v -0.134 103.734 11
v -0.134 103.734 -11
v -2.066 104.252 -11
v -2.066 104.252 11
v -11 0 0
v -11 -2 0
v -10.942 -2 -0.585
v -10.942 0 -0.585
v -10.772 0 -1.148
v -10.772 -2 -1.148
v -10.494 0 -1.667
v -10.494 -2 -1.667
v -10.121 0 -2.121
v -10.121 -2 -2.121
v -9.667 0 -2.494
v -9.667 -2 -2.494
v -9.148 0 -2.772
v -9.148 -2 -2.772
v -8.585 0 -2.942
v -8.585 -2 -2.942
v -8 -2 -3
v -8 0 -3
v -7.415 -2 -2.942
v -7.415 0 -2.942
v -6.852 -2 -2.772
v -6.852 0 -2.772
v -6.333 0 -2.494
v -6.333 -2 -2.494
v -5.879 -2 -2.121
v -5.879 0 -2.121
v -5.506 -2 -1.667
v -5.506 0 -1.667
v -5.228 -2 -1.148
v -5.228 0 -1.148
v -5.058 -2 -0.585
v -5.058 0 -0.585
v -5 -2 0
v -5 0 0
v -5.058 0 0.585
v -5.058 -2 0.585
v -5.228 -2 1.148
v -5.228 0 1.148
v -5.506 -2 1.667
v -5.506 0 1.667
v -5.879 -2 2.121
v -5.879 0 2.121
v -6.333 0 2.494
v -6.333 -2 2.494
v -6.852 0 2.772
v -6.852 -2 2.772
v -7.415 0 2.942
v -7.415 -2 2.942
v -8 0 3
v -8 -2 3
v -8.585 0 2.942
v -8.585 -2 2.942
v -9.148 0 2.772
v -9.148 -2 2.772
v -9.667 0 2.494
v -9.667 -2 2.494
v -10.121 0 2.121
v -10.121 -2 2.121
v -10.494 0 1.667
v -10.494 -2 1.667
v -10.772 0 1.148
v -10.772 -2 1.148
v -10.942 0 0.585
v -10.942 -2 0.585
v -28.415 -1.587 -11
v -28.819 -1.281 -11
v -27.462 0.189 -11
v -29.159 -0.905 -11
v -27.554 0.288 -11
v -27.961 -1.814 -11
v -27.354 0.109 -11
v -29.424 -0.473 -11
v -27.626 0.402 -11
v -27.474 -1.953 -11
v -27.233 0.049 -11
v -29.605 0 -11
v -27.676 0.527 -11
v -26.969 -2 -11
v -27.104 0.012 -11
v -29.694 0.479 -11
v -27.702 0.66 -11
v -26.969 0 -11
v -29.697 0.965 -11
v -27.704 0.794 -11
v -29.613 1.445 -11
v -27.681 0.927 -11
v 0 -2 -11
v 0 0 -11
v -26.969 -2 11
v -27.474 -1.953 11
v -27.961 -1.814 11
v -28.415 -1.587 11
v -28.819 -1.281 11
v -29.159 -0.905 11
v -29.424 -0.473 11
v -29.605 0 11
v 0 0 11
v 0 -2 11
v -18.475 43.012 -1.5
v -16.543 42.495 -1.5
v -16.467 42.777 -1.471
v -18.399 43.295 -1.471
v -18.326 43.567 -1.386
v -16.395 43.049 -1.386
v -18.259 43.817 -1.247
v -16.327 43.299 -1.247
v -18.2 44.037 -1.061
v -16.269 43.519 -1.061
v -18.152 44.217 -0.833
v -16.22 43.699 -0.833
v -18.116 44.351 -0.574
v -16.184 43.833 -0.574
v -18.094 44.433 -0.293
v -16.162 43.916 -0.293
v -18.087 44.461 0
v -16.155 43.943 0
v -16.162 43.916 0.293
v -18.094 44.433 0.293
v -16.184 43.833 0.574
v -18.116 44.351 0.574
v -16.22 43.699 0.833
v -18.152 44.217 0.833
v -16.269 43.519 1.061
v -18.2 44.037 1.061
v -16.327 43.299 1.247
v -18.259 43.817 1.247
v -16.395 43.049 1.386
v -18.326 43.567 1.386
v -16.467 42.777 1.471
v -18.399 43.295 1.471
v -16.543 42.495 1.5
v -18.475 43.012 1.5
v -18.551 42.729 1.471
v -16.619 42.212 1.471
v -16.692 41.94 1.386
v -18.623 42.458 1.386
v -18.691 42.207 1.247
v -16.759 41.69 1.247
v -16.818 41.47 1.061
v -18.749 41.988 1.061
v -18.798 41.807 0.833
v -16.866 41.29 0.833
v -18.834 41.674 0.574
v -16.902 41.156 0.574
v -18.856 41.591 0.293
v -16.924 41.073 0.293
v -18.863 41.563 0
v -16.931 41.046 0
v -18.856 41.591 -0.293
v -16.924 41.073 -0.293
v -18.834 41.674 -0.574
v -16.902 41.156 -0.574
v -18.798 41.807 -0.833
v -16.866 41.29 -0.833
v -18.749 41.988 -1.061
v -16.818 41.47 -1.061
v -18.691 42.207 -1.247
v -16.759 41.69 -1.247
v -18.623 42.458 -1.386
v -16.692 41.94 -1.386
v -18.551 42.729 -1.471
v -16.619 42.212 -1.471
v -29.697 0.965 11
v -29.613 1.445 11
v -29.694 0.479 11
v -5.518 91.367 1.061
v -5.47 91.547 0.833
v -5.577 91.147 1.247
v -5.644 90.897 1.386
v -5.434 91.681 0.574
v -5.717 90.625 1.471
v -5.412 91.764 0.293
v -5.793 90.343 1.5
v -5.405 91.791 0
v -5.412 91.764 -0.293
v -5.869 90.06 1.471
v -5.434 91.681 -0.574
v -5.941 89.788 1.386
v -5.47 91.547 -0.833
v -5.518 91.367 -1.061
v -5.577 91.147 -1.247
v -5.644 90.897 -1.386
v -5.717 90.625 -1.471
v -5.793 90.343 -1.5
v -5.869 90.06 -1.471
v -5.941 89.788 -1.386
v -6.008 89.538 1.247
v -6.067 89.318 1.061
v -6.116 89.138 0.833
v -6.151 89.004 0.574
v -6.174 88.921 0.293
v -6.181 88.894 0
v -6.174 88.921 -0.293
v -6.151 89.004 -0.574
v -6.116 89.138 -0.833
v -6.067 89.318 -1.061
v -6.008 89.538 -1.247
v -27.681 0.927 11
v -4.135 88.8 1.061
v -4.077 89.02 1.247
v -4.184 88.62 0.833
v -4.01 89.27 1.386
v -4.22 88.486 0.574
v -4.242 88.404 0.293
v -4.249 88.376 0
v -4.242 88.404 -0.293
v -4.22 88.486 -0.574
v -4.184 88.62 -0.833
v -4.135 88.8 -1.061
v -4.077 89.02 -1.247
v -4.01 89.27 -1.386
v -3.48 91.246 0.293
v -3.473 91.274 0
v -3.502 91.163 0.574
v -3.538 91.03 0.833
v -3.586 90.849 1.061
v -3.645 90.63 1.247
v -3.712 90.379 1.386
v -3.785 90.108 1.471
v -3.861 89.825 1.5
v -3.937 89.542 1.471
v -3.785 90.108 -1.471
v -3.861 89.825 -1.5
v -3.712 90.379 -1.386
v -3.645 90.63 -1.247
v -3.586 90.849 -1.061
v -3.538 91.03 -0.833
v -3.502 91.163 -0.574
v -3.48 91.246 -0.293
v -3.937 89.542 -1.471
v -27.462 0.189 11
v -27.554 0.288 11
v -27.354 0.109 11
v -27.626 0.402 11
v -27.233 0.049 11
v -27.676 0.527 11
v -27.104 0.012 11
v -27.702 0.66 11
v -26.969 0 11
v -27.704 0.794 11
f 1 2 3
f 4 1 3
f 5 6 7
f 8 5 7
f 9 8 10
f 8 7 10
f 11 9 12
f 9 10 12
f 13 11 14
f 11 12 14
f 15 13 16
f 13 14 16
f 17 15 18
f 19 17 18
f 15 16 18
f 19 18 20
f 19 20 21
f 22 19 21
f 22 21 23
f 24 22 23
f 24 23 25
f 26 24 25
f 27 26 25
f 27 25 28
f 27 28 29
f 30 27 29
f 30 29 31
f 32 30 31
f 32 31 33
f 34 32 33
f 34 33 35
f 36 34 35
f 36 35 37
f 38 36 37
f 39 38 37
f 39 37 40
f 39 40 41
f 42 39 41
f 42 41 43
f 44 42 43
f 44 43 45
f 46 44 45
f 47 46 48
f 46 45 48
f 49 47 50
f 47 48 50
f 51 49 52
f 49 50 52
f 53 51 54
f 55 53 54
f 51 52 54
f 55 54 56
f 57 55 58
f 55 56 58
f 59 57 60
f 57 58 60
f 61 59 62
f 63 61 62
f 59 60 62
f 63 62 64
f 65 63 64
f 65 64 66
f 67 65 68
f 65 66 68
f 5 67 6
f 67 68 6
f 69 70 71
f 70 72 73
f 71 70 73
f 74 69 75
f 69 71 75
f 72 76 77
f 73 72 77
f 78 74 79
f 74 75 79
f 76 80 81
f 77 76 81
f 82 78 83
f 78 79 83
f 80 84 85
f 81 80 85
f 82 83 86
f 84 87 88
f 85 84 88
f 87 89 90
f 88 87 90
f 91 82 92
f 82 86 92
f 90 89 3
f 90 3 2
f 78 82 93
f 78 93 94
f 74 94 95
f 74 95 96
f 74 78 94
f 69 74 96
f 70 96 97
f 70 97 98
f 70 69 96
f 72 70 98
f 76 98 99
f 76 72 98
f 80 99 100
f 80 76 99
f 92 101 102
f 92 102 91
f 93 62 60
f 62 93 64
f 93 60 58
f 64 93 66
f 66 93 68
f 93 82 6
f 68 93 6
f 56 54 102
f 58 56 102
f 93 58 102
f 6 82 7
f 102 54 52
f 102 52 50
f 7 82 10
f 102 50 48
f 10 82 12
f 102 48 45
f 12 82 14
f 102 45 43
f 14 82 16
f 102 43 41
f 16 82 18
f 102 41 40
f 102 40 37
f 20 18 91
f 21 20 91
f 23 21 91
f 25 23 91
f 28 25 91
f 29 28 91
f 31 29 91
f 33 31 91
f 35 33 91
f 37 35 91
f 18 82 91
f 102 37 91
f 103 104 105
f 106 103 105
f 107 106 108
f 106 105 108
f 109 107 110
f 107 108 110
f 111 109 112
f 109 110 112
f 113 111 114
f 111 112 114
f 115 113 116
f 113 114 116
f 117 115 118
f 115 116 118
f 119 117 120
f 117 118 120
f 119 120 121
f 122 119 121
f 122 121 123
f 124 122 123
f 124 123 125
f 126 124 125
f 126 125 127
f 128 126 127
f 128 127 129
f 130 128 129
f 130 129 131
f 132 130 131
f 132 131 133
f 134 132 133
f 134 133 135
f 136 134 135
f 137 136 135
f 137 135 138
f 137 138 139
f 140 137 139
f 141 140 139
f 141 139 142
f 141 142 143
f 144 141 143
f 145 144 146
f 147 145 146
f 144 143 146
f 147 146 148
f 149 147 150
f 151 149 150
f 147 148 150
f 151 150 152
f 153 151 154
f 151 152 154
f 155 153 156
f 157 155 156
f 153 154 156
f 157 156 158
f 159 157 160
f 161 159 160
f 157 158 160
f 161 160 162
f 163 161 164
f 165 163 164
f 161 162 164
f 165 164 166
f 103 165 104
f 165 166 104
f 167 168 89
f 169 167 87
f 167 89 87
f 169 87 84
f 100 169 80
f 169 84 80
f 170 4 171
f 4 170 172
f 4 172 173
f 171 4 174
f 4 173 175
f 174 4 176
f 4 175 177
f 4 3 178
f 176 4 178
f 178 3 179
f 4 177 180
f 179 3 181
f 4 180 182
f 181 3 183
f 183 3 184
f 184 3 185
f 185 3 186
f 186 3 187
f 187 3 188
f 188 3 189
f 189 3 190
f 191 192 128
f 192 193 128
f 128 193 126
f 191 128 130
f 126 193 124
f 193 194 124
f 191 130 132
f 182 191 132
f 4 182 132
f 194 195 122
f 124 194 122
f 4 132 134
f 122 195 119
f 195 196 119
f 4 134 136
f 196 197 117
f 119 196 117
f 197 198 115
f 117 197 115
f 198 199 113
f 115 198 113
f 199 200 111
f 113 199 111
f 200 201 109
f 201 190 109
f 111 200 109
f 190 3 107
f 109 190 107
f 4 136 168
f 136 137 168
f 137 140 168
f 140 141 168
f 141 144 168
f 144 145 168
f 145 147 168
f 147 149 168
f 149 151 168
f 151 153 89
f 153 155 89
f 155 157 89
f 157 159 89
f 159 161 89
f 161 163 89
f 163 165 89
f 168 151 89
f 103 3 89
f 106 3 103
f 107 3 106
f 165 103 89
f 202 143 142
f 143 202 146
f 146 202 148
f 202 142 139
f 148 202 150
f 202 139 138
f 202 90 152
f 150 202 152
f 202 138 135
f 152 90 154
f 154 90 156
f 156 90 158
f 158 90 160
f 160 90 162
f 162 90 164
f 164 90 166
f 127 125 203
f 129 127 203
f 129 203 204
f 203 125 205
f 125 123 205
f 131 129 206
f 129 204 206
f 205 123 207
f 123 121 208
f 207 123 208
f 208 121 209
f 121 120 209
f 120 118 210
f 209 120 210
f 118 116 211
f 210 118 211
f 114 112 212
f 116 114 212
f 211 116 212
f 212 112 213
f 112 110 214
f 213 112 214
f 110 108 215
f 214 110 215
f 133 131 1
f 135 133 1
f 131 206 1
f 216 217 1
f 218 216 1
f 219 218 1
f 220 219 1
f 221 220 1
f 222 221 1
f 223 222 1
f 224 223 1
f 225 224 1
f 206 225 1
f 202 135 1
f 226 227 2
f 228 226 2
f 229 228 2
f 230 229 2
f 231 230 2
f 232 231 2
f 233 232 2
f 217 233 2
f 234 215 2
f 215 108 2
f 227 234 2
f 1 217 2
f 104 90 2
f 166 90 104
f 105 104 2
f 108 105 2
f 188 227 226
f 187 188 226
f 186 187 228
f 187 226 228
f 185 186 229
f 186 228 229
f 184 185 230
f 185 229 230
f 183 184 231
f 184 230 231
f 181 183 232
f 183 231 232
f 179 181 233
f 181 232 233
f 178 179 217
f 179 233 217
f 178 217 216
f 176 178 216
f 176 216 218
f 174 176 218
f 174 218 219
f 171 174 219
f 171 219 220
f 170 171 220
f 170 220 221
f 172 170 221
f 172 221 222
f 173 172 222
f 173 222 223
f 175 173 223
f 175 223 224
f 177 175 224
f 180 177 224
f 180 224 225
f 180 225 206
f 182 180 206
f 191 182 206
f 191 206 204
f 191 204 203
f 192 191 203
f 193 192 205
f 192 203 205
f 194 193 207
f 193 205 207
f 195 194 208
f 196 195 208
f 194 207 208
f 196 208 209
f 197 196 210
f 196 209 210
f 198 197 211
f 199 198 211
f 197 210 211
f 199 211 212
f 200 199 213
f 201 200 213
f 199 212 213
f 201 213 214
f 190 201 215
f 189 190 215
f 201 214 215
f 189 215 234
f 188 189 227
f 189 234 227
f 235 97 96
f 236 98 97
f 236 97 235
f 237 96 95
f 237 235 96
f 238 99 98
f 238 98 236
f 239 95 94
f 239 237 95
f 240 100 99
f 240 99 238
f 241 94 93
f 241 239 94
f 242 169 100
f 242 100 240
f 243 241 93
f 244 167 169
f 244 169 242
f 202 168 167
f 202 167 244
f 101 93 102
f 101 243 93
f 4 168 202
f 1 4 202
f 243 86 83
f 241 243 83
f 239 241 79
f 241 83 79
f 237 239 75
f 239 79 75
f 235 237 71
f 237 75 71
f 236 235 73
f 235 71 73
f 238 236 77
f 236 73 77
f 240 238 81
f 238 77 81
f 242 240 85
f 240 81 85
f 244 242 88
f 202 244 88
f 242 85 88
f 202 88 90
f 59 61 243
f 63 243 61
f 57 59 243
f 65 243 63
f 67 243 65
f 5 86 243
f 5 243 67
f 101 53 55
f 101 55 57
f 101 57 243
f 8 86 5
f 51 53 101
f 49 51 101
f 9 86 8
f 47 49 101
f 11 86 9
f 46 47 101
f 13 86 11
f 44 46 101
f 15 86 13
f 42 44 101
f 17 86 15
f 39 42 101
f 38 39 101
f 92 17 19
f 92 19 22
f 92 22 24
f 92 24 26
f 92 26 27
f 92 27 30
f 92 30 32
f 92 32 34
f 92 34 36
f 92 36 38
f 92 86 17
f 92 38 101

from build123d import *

# Parameters (mm, degrees)
SKETCH2_W                 = 30
SKETCH2_H                 = 22
BASE_FLANGE1_DEPTH        = 2
EDGE_FLANGE1_START        = -11
EDGE_FLANGE1_DEPTH        = 22
EDGE_FLANGE1_2_DEPTH      = 22
F_6_0MM_DOWEL_HOLE1_D     = 6
F_6_0MM_DOWEL_HOLE1_DEPTH = 2
F_3_0MM_DOWEL_HOLE1_D     = 3


# Read off the part's stored shape, not the designer's step: Edge-Flange1
# Sheet-metal steps are written as plain solids
with BuildPart() as part:
    # Sketch2 → Base-Flange1 (new body)
    with BuildSketch(Plane(origin=(0, 0, 0), x_dir=(1, 0, 0), z_dir=(0, 1, 0))):
        with Locations((-15, 0)):
            Rectangle(SKETCH2_W, SKETCH2_H)
    extrude(amount=-BASE_FLANGE1_DEPTH)

    # Edge-Flange1 outline → Edge-Flange1 (cut)
    with BuildSketch(Plane.XY.offset(EDGE_FLANGE1_START)):
        with BuildLine():
            ThreePointArc((-26.96949183, -2), (-28.62375904, -1.443395312), (-29.605094228, 0))
            Line((-29.605094228, 0), (-30, 0))
            Line((-30, 0), (-30, -2))
            Line((-30, -2), (-26.96949183, -2))
        make_face()
    extrude(amount=EDGE_FLANGE1_DEPTH, mode=Mode.SUBTRACT)

    # Edge-Flange1 2 outline → Edge-Flange1 2 (add)
    with BuildSketch(Plane.XY.offset(EDGE_FLANGE1_START)):
        with BuildLine():
            Line((-2.065803424, 104.251840892), (-29.612844446, 1.444884199))
            ThreePointArc((-29.612844446, 1.444884199), (-29.706052463, 0.721921355), (-29.605094228, 0))
            Line((-29.605094228, 0), (-26.96949183, 0))
            ThreePointArc((-26.96949183, 0), (-27.5538759, 0.288186332), (-27.680992793, 0.927246109))
            Line((-27.680992793, 0.927246109), (-0.133951771, 103.734202802))
            Line((-0.133951771, 103.734202802), (-2.065803424, 104.251840892))
        make_face()
    extrude(amount=EDGE_FLANGE1_2_DEPTH)

    # Ø6.0mm Dowel Hole1
    with Locations(Plane(origin=(0, 0, 0), x_dir=(1, 0, 0), z_dir=(0, 1, 0))):
        with Locations((-8, 0)):
            Hole(F_6_0MM_DOWEL_HOLE1_D / 2, depth=F_6_0MM_DOWEL_HOLE1_DEPTH)

    # Ø3.0mm Dowel Hole1 (through all)
    with Locations(Plane(origin=(-27.990381057, 7.5, 0), x_dir=(0, 0, 1), z_dir=(-0.9659258262890691, 0.258819045102518, 0))):
        with Locations((0, 85.764876286), (0, 36.764876286)):
            Hole(F_3_0MM_DOWEL_HOLE1_D / 2)


solid = part.part
